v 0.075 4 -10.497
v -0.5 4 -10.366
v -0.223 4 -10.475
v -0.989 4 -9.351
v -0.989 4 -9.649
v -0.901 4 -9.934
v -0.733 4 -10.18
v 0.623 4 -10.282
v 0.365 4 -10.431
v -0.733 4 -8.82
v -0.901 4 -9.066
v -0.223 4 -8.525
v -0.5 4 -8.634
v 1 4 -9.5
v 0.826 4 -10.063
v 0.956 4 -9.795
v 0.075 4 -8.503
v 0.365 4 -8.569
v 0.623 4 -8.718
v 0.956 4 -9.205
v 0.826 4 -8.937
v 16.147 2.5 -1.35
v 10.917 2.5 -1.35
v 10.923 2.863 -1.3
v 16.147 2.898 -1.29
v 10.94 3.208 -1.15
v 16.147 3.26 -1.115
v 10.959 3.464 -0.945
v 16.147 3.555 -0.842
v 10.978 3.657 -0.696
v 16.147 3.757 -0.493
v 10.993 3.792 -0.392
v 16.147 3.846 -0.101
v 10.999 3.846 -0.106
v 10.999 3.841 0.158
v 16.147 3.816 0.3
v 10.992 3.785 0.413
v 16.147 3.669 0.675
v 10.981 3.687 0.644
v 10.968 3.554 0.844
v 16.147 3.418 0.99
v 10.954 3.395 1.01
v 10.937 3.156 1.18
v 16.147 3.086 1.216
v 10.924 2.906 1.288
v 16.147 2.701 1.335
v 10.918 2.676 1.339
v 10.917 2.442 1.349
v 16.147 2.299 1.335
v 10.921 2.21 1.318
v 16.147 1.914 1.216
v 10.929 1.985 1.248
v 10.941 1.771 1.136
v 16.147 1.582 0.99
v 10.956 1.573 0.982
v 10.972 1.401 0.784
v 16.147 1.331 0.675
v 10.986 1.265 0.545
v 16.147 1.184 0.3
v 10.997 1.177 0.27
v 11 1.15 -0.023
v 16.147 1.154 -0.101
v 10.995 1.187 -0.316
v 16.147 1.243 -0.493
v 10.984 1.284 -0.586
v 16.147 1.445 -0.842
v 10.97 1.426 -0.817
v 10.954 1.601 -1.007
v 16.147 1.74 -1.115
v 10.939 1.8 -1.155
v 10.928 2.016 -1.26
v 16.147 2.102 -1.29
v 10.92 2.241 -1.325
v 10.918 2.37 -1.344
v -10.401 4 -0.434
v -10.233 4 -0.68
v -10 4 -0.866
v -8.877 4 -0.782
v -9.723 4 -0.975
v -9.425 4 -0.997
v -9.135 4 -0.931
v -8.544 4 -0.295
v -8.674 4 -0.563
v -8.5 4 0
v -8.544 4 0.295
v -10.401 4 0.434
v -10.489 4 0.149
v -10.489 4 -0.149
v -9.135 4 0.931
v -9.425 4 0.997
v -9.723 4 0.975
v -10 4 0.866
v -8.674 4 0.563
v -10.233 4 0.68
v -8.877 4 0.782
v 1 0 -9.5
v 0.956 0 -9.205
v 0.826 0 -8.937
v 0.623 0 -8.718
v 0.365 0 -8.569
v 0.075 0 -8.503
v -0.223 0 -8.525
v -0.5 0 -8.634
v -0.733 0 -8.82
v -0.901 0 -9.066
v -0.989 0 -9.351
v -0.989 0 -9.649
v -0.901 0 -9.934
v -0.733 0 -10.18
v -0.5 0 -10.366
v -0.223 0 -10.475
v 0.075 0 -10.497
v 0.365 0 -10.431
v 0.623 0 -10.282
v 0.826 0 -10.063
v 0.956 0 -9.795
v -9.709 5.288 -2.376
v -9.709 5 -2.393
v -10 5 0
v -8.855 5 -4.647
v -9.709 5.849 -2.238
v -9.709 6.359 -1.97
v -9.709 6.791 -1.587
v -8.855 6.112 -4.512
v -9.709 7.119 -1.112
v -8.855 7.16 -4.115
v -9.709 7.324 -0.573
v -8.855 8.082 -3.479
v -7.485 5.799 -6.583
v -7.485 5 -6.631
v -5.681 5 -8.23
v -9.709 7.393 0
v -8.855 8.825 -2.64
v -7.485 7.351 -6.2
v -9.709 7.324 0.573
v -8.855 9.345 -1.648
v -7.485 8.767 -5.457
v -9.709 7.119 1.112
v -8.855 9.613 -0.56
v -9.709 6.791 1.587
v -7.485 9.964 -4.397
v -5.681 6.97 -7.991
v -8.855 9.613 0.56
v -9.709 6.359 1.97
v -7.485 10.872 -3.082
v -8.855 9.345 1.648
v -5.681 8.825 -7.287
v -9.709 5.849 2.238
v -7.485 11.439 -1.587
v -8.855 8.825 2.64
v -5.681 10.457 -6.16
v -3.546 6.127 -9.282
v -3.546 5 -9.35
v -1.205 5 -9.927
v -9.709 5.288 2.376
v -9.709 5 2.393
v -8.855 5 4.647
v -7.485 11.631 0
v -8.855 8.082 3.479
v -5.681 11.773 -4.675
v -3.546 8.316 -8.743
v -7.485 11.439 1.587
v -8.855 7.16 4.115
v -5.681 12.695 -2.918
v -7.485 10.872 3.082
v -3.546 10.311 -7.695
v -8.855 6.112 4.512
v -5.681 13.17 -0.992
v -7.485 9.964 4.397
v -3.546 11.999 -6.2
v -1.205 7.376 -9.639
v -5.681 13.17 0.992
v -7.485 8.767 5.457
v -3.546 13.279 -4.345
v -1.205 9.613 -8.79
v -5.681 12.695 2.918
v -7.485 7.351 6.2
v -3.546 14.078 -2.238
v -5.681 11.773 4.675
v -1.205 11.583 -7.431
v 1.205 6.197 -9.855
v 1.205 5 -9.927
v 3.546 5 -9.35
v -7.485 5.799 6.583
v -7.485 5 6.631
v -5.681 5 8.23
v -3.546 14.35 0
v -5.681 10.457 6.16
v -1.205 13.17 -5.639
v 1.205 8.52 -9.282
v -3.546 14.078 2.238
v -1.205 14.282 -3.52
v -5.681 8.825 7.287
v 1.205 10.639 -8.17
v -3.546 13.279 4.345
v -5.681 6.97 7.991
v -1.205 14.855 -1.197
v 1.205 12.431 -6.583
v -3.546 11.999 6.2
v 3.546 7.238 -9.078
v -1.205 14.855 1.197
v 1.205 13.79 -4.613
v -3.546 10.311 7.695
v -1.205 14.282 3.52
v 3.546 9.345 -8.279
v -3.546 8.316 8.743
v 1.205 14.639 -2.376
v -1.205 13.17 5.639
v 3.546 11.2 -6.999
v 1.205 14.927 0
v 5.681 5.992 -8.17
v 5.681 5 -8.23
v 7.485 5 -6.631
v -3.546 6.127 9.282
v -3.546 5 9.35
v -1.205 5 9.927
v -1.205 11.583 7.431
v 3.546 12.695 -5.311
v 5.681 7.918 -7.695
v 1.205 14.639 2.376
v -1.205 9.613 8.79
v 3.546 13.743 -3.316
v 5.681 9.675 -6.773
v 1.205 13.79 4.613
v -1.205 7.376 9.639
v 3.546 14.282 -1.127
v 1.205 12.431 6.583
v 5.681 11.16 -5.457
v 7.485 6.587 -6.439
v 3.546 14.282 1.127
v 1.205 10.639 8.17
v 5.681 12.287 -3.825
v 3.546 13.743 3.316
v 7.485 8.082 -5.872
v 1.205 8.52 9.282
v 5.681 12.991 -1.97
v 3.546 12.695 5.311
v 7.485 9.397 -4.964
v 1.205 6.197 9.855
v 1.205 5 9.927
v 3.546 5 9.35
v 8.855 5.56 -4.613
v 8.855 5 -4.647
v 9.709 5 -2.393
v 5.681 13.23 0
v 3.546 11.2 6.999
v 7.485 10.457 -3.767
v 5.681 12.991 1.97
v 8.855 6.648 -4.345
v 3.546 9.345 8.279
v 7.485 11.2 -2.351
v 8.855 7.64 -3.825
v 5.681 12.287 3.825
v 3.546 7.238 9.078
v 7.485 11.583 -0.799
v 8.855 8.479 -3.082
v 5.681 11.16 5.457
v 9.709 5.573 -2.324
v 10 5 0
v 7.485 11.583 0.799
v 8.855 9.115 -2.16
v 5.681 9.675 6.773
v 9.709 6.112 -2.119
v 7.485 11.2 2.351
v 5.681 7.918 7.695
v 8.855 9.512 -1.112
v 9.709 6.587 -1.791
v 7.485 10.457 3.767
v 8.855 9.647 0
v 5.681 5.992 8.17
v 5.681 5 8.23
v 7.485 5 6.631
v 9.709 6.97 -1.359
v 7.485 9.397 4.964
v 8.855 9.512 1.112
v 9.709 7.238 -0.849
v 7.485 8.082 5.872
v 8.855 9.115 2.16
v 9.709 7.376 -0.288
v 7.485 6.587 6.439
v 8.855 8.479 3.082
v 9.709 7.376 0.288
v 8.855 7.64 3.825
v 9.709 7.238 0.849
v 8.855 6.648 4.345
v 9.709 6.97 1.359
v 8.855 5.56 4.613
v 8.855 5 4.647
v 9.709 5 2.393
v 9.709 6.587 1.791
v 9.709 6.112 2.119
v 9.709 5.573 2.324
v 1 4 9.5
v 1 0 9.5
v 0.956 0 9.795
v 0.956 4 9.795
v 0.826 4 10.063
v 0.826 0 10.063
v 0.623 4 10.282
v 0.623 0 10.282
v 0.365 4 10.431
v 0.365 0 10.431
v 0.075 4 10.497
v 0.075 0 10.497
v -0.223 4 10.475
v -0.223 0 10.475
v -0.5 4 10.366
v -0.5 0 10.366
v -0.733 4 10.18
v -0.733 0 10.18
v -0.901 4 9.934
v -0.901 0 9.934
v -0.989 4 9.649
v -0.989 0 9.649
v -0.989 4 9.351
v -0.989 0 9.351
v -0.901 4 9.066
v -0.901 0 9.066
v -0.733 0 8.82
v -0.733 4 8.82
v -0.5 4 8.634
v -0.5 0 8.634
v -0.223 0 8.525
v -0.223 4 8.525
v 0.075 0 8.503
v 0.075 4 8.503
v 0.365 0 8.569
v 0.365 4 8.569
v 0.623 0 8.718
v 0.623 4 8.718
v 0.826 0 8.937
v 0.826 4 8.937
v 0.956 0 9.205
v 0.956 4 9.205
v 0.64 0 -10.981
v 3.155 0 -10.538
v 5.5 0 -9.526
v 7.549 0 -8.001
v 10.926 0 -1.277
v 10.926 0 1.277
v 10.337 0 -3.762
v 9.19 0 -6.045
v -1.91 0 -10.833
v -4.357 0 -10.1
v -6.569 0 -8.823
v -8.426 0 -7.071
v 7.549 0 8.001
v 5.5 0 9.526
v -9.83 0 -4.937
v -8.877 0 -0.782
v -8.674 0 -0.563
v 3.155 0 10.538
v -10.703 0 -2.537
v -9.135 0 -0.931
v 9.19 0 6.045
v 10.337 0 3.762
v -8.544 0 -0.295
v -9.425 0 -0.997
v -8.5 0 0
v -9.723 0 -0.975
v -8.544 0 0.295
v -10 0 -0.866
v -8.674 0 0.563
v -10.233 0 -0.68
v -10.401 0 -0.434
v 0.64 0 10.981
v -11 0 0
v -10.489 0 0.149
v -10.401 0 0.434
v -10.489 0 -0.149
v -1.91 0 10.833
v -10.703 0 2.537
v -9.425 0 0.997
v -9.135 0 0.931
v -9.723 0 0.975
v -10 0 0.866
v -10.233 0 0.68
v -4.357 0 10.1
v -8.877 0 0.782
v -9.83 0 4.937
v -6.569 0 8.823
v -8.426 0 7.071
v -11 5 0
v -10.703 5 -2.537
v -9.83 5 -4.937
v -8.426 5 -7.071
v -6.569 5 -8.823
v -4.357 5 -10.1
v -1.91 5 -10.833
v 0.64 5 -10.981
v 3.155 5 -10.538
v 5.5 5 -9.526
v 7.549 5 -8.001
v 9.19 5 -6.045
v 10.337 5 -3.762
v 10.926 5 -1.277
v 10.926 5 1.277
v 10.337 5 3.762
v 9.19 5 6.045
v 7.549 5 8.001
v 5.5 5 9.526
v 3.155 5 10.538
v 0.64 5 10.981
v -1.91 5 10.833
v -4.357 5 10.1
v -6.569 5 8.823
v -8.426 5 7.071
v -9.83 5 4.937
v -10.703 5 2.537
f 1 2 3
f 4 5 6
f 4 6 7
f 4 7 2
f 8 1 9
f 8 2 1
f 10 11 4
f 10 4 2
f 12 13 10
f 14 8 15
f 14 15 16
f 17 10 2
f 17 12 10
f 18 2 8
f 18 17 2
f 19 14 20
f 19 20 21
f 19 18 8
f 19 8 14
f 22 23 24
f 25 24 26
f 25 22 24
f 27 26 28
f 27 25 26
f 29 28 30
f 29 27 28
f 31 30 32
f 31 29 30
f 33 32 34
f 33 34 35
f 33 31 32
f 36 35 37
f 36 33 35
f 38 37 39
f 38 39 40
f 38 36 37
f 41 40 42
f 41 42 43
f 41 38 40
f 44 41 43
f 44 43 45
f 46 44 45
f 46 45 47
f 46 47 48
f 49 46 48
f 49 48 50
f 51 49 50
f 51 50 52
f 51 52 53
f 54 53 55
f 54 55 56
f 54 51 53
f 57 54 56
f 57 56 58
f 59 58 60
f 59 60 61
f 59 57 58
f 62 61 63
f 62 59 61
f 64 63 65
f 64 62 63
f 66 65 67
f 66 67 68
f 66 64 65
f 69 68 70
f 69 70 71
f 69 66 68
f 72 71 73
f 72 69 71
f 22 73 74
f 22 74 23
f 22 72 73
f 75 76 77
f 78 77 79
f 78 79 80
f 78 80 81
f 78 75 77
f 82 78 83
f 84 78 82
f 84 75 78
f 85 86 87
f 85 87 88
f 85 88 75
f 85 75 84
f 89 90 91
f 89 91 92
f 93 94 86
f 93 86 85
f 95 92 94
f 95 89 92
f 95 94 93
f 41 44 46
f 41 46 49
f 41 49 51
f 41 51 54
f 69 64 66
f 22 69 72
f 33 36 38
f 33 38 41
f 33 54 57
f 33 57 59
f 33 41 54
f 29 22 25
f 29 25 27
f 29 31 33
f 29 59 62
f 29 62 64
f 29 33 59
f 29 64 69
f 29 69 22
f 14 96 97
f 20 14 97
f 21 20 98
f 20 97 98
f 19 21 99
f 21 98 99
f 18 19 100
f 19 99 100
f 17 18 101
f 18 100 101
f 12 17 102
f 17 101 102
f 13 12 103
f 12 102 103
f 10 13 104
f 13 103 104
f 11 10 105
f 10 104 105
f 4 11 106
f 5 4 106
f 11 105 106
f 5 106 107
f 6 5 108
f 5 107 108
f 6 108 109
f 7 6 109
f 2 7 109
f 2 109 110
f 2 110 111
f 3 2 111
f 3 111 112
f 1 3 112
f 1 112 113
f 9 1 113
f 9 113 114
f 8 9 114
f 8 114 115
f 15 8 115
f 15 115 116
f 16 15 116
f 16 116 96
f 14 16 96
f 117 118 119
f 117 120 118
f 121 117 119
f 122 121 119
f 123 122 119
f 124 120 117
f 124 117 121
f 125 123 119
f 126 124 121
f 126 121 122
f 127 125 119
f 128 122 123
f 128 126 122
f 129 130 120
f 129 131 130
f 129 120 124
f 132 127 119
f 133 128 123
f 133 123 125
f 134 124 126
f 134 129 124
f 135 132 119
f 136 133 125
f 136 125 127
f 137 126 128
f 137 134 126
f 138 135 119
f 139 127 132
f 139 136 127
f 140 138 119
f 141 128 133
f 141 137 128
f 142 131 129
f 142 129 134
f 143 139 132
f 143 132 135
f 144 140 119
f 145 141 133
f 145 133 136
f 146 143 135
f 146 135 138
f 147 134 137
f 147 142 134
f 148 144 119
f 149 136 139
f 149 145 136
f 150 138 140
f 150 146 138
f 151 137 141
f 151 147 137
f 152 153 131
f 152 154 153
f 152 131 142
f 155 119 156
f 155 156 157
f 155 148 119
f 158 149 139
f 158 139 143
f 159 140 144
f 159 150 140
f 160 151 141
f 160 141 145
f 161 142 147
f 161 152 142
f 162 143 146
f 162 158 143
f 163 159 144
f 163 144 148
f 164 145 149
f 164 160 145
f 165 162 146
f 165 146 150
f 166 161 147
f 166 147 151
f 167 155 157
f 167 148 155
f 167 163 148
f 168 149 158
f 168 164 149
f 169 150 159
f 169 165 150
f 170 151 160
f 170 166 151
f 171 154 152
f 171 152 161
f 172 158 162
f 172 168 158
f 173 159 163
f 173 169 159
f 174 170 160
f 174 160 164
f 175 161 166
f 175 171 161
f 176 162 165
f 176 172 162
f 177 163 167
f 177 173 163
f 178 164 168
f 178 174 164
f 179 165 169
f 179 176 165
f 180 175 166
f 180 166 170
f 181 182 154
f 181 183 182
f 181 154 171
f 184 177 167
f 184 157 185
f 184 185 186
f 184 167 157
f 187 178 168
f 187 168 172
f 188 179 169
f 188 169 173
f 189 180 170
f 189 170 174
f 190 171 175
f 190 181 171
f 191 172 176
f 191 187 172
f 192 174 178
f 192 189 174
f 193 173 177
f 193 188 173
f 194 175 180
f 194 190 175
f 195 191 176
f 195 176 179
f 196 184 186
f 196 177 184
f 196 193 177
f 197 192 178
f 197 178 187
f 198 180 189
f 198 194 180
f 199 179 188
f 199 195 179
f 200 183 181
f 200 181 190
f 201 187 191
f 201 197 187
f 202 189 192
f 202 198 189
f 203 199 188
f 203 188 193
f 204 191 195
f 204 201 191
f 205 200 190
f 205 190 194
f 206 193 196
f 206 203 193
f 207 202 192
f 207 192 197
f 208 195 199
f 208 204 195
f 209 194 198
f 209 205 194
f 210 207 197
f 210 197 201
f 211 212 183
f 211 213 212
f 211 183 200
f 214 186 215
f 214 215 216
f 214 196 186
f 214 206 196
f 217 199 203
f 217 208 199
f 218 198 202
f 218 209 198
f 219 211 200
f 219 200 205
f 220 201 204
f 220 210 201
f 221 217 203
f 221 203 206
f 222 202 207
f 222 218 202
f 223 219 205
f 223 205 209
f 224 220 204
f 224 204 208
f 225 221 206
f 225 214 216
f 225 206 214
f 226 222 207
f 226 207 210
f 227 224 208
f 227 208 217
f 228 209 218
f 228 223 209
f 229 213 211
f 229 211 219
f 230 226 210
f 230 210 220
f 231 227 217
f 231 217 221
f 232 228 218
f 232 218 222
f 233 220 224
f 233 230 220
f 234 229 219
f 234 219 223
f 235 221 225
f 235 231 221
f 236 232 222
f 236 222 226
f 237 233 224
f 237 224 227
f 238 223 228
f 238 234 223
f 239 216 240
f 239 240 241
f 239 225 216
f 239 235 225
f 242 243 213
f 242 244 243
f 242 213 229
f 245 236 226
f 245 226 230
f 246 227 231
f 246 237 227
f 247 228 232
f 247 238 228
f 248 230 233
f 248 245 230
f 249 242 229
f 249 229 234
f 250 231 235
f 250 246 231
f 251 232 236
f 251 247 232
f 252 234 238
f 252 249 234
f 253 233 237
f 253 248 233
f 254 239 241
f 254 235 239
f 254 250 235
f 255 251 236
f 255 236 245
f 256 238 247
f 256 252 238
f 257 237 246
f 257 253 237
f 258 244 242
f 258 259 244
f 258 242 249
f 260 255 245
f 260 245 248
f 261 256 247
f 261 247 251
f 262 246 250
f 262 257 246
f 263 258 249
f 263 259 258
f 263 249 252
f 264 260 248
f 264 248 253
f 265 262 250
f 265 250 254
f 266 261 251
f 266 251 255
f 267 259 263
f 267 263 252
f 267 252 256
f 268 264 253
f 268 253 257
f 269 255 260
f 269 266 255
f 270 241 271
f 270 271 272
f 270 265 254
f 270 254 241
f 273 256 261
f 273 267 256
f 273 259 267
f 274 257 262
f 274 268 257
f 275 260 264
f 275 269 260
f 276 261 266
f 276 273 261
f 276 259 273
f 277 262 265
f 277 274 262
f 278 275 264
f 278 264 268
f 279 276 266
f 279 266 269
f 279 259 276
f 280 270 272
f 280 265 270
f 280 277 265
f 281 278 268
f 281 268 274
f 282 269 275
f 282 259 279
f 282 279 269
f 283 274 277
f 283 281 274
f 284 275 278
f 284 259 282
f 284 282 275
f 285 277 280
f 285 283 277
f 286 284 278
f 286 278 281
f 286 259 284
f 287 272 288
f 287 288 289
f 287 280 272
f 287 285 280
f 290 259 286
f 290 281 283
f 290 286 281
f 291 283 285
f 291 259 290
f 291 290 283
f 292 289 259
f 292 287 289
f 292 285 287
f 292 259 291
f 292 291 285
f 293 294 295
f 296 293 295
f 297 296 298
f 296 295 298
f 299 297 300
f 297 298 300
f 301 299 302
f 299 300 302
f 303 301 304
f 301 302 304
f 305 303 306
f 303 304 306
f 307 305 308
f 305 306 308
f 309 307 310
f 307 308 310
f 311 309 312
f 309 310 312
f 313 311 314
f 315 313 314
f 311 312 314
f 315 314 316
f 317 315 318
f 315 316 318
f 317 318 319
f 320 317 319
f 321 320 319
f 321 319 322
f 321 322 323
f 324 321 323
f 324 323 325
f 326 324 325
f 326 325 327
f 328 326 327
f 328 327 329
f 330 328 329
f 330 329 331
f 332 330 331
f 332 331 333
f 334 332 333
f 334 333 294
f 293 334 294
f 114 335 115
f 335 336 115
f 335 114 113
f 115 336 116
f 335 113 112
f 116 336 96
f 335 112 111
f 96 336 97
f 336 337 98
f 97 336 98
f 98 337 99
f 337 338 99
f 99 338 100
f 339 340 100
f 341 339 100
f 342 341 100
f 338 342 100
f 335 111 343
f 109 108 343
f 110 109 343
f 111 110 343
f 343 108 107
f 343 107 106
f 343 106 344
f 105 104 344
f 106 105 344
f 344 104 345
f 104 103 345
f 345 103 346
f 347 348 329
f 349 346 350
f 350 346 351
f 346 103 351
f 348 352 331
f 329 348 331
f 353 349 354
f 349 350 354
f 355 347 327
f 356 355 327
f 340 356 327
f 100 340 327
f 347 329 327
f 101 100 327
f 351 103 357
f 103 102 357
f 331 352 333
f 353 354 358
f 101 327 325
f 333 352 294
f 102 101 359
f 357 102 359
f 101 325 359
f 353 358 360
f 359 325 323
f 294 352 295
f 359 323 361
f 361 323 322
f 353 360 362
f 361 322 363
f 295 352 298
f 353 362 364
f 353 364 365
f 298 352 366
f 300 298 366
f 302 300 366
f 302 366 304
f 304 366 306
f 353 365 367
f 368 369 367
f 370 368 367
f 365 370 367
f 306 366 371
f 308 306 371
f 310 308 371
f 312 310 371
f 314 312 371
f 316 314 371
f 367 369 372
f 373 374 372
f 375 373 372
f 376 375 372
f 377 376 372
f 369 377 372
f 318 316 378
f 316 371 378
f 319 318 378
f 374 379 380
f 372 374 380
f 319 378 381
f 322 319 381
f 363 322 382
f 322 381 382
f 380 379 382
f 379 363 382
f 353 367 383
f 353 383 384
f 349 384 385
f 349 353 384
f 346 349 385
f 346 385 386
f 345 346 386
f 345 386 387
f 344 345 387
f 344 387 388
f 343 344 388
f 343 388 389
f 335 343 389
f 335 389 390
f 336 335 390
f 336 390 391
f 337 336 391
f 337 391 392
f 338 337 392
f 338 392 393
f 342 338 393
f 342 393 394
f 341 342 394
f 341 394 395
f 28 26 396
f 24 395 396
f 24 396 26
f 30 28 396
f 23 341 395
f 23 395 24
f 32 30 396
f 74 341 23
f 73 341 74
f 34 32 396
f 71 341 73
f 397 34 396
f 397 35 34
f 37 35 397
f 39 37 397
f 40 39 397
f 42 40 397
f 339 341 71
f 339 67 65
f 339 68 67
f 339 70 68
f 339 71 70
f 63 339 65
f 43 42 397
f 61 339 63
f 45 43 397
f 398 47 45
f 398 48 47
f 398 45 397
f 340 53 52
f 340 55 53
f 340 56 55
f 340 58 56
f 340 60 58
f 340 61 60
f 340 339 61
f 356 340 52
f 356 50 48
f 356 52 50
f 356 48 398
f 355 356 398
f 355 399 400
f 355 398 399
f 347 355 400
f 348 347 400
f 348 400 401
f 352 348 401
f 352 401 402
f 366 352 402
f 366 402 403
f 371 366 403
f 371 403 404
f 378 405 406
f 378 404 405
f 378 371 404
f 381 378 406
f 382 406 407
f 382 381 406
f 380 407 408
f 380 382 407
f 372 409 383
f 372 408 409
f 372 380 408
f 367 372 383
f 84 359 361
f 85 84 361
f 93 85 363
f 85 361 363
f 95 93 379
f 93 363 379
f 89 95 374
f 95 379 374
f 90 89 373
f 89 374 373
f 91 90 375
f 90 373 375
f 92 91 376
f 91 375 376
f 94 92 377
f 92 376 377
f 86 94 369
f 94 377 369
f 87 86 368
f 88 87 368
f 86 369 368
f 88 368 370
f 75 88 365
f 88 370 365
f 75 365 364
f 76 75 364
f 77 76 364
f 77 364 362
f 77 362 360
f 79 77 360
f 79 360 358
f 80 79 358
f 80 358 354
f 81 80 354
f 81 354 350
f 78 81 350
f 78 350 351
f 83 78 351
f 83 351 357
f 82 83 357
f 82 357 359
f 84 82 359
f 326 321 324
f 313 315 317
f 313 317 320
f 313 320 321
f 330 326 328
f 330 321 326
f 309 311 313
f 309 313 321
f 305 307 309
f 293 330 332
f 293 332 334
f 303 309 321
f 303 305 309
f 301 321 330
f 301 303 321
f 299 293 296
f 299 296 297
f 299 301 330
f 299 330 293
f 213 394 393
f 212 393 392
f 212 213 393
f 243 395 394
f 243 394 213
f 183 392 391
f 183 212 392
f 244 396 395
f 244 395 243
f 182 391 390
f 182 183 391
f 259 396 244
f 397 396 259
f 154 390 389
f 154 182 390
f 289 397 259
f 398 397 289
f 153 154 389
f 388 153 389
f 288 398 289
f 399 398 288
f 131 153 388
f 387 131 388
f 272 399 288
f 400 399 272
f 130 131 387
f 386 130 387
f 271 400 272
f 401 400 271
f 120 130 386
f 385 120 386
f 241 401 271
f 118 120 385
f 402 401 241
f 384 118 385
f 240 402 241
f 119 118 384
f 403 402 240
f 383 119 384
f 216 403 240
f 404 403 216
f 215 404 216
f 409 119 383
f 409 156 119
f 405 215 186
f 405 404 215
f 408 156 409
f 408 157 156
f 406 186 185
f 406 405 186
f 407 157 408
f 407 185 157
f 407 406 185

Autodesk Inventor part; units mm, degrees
ref_plane "YZ Plane" through (0, 0, 0) normal (1, 0, 0) x (0, 1, 0)
ref_plane "XZ Plane" through (0, 0, 0) normal (0, 1, 0) x (-1, 0, 0)
ref_plane "XY Plane" through (0, 0, 0) normal (0, 0, 1) x (1, 0, 0)
sketch "Esquisse1" plane through (0, 0, 0) normal (0, 1, 0) x (-1, 0, 0)
  circle A0 centre (0, 0) radius 11
  dimension "d1" = 22
extrude "Extrusion1" add sketch "Esquisse1" along normal blind 5
sketch "Esquisse2" plane through (0, 5, 0) normal (0, 1, 0) x (1, 0, 0)
  arc A0 (-10, 0) -> (10, 0) centre (0, 0) ccw
  line L0 (-10, 0) -> (10, 0)
  dimension "d4" = 20
revolve "Révolution1" add sketch "Esquisse2" angle 180 about axis through (-10, 5, 0) along (-1, 0, 0)
ref_plane "Plan de construction1" through (16.1473, 5, 0) normal (1, 0, 0) x (0, 0, -1)
sketch "Esquisse6" plane through (16.1473, 5, 0) normal (1, 0, 0) x (0, 0, -1)
  circle A0 centre (0, -2.5) radius 1.35
  point P0 (0, -5)
  point P1 (0, -1.15)
  dimension "d11" = 2.7
extrude "Extrusion4" add sketch "Esquisse6" against normal blind 5.25
sketch "Esquisse7" plane through (0, 0, 0) normal (0, -1, 0) x (1, 0, 0)
  circle A0 centre (0, 9.5) radius 1
  circle A1 centre (0, -9.5) radius 1
  circle A2 centre (-9.5, 0) radius 1
  point P0 (0, 0)
  dimension "d15" = 2
  dimension "d16" = 2
  dimension "d17" = 2
extrude "Extrusion5" cut sketch "Esquisse7" against normal blind 4
properties part number "Capteur optoforce"
